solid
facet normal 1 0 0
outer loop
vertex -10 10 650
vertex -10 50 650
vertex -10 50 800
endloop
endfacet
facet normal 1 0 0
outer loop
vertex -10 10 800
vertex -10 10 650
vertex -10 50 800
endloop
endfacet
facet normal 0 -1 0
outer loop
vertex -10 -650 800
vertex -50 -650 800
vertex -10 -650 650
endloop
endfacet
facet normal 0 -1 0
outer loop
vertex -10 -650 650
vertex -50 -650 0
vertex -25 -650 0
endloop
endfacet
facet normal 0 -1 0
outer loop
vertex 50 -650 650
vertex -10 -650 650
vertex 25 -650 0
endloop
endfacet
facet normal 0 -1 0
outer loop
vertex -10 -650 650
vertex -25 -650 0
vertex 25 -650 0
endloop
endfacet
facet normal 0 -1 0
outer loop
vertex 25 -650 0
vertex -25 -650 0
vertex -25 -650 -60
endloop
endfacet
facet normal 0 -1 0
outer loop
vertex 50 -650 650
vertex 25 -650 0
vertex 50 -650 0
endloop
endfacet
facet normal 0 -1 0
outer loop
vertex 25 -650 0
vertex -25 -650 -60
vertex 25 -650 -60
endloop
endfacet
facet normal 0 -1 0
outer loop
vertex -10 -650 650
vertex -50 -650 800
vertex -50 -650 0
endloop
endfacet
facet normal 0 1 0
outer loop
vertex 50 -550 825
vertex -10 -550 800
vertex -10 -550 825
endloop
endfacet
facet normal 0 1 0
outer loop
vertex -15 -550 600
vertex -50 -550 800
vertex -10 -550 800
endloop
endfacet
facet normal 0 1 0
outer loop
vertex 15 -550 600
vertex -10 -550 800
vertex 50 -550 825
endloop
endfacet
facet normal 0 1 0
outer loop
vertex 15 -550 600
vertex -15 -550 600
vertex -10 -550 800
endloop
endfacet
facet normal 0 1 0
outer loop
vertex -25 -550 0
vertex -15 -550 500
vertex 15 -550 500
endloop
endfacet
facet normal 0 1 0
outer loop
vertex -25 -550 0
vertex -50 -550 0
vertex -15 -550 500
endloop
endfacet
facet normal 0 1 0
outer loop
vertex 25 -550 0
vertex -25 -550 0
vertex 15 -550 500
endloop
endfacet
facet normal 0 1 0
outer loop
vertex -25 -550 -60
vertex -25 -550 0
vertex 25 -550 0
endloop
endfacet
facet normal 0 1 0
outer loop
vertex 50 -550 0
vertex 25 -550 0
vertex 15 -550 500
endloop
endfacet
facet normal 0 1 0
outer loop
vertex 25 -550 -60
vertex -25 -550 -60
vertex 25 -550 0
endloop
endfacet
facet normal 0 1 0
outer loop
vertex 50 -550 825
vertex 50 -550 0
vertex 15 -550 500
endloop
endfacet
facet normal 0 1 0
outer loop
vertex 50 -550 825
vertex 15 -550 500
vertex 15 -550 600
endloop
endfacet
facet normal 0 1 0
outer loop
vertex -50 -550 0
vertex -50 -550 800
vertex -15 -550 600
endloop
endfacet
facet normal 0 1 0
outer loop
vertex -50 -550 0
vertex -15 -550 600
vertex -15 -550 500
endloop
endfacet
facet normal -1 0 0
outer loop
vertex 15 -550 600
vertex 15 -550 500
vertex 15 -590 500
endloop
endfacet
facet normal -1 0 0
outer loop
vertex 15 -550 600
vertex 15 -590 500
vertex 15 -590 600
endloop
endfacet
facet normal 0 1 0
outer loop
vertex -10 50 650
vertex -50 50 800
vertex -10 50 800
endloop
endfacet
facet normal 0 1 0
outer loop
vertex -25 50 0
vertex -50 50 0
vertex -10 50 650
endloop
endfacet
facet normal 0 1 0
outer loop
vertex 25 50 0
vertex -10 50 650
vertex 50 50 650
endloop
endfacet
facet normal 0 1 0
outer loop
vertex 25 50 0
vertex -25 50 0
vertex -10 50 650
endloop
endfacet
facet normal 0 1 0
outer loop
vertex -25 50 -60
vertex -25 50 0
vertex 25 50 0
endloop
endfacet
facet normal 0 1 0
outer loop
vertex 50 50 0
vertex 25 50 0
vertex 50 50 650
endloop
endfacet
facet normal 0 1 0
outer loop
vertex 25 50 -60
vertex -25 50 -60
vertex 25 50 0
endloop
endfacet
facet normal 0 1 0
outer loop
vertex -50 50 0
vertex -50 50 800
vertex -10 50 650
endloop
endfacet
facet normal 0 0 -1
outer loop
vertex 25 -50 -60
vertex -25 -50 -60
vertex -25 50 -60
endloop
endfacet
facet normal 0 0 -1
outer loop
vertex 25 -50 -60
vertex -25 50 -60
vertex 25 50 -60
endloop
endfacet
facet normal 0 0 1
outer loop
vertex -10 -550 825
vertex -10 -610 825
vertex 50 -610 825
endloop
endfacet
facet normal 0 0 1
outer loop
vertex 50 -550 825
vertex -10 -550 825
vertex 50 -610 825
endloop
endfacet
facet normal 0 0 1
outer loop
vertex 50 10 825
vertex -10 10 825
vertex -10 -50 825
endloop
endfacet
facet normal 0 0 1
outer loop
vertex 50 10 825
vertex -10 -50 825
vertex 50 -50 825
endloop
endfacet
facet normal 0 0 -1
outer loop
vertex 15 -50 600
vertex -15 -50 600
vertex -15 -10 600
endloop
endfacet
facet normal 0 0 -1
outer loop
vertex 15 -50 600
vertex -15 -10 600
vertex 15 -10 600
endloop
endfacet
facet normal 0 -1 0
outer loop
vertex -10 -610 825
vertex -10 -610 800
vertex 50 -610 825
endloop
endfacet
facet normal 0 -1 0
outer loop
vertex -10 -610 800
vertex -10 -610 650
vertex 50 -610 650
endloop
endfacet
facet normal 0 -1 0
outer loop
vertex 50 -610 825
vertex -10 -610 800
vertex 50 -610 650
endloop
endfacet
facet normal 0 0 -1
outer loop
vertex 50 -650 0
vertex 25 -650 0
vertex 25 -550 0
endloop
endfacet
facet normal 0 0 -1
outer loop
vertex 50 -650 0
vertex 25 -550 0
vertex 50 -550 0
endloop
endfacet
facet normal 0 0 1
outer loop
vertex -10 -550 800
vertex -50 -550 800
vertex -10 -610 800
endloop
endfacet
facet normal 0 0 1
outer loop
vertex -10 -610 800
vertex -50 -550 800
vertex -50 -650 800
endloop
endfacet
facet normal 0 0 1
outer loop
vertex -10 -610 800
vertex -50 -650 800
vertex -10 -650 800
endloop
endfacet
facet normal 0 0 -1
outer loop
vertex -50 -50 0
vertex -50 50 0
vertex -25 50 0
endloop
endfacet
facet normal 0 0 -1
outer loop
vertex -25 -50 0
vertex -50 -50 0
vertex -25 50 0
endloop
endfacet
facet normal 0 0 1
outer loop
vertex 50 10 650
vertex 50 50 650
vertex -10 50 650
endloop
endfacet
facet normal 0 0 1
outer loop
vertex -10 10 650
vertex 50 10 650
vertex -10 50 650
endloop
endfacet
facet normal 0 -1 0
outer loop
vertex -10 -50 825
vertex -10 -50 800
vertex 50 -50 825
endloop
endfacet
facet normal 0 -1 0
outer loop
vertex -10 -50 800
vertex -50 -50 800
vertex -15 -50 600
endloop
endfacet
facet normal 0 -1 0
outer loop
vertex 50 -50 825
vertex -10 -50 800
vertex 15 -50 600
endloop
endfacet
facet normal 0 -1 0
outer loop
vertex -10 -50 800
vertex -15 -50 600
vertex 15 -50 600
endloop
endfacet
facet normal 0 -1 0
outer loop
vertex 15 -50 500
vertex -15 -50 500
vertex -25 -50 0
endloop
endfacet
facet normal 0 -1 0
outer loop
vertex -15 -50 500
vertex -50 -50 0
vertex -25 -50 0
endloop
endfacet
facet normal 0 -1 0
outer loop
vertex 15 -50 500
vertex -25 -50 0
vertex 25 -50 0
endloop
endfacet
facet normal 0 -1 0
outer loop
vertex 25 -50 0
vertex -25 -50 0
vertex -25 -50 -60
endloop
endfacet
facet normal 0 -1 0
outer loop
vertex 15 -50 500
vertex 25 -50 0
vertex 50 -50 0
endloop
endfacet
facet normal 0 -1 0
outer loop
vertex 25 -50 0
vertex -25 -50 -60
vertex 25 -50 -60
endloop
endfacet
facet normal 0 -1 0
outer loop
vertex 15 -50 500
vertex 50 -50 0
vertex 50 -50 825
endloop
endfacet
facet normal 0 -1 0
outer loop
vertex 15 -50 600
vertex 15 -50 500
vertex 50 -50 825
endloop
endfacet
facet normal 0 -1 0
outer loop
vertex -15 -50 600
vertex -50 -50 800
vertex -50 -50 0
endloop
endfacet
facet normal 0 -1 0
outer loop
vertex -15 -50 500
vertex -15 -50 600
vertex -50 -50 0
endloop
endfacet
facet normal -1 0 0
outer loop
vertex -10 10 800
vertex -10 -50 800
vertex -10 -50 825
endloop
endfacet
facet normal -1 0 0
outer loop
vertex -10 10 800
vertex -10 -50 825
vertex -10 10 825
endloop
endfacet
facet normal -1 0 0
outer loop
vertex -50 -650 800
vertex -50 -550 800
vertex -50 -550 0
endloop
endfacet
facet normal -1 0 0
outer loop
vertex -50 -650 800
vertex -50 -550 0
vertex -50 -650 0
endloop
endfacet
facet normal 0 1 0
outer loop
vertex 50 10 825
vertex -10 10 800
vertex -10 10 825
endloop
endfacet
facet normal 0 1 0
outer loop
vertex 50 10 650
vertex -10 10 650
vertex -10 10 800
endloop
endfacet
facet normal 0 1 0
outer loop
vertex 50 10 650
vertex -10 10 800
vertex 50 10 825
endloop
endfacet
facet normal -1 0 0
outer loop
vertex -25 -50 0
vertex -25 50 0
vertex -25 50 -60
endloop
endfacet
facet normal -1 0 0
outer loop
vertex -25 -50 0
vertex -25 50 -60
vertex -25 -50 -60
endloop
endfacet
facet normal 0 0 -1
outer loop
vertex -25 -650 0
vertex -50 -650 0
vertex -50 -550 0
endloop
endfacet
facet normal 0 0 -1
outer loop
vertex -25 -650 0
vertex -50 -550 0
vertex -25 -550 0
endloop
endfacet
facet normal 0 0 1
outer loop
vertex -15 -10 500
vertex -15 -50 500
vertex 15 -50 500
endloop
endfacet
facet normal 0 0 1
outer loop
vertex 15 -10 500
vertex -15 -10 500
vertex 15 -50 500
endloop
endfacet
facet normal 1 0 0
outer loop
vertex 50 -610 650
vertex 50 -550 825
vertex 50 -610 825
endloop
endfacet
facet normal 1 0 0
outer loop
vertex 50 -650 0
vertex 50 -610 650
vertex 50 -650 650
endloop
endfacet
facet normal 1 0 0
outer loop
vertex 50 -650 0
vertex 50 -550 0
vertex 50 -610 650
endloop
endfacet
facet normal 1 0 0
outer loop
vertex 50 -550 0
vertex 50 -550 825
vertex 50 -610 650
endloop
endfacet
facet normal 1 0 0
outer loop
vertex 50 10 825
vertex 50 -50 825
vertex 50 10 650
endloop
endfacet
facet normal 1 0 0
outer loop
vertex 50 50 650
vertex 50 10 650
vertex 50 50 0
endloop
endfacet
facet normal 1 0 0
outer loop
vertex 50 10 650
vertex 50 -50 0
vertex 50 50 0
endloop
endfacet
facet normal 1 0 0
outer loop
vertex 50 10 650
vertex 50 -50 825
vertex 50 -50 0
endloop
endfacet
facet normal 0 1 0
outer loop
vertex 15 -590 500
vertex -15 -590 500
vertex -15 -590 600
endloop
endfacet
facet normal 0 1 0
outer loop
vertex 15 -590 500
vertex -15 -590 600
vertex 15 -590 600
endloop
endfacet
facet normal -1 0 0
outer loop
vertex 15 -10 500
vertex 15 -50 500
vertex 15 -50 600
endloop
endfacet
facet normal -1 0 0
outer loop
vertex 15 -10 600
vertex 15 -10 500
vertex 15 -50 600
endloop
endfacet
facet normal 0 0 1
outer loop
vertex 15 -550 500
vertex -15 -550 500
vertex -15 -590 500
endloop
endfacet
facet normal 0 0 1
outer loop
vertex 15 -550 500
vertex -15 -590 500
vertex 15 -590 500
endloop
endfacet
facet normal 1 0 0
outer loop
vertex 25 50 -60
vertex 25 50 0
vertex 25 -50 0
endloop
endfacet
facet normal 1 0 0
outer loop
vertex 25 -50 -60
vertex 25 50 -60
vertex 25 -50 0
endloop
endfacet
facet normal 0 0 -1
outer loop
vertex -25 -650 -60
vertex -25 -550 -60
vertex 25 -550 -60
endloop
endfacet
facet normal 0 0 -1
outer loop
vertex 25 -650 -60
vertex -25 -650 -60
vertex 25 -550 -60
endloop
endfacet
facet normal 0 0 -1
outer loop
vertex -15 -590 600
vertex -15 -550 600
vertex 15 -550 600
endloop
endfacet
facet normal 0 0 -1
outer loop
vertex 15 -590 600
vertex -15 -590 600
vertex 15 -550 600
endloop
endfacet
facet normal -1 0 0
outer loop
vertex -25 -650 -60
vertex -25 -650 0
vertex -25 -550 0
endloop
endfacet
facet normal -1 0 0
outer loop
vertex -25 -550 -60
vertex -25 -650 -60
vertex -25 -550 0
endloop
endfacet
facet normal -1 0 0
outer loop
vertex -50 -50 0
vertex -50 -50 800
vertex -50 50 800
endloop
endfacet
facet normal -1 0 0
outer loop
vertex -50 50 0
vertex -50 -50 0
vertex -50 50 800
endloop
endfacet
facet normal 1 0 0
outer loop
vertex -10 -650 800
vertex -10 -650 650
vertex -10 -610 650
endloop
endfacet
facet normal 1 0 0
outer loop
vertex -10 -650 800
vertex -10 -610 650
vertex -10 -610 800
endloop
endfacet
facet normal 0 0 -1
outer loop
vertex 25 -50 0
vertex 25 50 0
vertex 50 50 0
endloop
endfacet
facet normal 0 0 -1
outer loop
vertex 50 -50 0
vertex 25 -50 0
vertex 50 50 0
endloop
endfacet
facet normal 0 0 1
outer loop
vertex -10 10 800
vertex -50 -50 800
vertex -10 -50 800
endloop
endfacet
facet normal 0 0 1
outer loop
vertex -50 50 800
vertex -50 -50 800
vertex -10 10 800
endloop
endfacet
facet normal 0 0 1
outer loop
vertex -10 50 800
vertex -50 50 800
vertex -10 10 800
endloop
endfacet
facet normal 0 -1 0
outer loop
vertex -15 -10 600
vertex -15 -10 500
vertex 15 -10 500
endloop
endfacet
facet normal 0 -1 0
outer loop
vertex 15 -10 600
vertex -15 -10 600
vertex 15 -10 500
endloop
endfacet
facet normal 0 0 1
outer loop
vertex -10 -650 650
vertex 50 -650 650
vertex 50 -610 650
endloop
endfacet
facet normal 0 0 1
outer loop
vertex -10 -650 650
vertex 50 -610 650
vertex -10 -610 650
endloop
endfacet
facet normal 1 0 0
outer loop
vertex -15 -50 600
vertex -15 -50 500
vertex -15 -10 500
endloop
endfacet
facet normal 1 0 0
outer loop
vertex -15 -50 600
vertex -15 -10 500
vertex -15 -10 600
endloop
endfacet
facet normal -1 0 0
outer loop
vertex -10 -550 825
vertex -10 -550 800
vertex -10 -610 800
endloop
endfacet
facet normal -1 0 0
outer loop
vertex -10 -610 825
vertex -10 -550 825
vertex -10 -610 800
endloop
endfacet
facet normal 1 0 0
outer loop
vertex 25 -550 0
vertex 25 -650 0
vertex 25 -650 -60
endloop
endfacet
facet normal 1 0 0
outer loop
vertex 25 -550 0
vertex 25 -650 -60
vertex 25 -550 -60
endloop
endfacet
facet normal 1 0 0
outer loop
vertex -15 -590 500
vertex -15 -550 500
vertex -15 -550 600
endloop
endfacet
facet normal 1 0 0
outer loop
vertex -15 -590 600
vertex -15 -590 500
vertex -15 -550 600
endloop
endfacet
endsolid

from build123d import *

# Parameters (mm, degrees)
F3_W      = 100
F3_H      = 100
F4_DEPTH  = 800
F5_W      = 50
F5_H      = 100
F6_DEPTH  = 60
F7_W      = 30
F7_H      = 100
F8_DEPTH  = 40
F9_W      = 60
F9_H      = 150
F10_DEPTH = 40
F11_W     = 60
F11_H     = 60
F12_DEPTH = 25


with BuildPart() as f4:
    # F3 (on Top) → F4 (new body)
    with BuildSketch(Plane.XY):
        Rectangle(F3_W, F3_H)
    extrude(amount=F4_DEPTH)

    # F5 (on face) → F6 (join)
    with BuildSketch(Plane(origin=(0, 0, 0), x_dir=(1, 0, 0), z_dir=(0, 0, -1))):
        Rectangle(F5_W, F5_H)
    extrude(amount=F6_DEPTH)

    # F7 (on face) → F8 (cut)
    with BuildSketch(Plane.XZ.offset(50)):
        with Locations((0, 550)):
            Rectangle(F7_W, F7_H)
    extrude(amount=-F8_DEPTH, mode=Mode.SUBTRACT)

    # F9 (on face) → F10 (cut)
    with BuildSketch(Plane(origin=(0, 50, 0), x_dir=(-1, 0, 0), z_dir=(0, 1, 0))):
        with Locations((-20, 725)):
            Rectangle(F9_W, F9_H)
    extrude(amount=-F10_DEPTH, mode=Mode.SUBTRACT)

    # F11 (on face) → F12 (join)
    with BuildSketch(Plane.XY.offset(800)):
        with Locations((20, -20)):
            Rectangle(F11_W, F11_H)
    extrude(amount=F12_DEPTH)


with BuildPart() as f14_1:
    # F14: instance of F4
    add(f4.part.mirror(Plane.XZ.offset(300)))


solid = Compound([f4.part, f14_1.part])
